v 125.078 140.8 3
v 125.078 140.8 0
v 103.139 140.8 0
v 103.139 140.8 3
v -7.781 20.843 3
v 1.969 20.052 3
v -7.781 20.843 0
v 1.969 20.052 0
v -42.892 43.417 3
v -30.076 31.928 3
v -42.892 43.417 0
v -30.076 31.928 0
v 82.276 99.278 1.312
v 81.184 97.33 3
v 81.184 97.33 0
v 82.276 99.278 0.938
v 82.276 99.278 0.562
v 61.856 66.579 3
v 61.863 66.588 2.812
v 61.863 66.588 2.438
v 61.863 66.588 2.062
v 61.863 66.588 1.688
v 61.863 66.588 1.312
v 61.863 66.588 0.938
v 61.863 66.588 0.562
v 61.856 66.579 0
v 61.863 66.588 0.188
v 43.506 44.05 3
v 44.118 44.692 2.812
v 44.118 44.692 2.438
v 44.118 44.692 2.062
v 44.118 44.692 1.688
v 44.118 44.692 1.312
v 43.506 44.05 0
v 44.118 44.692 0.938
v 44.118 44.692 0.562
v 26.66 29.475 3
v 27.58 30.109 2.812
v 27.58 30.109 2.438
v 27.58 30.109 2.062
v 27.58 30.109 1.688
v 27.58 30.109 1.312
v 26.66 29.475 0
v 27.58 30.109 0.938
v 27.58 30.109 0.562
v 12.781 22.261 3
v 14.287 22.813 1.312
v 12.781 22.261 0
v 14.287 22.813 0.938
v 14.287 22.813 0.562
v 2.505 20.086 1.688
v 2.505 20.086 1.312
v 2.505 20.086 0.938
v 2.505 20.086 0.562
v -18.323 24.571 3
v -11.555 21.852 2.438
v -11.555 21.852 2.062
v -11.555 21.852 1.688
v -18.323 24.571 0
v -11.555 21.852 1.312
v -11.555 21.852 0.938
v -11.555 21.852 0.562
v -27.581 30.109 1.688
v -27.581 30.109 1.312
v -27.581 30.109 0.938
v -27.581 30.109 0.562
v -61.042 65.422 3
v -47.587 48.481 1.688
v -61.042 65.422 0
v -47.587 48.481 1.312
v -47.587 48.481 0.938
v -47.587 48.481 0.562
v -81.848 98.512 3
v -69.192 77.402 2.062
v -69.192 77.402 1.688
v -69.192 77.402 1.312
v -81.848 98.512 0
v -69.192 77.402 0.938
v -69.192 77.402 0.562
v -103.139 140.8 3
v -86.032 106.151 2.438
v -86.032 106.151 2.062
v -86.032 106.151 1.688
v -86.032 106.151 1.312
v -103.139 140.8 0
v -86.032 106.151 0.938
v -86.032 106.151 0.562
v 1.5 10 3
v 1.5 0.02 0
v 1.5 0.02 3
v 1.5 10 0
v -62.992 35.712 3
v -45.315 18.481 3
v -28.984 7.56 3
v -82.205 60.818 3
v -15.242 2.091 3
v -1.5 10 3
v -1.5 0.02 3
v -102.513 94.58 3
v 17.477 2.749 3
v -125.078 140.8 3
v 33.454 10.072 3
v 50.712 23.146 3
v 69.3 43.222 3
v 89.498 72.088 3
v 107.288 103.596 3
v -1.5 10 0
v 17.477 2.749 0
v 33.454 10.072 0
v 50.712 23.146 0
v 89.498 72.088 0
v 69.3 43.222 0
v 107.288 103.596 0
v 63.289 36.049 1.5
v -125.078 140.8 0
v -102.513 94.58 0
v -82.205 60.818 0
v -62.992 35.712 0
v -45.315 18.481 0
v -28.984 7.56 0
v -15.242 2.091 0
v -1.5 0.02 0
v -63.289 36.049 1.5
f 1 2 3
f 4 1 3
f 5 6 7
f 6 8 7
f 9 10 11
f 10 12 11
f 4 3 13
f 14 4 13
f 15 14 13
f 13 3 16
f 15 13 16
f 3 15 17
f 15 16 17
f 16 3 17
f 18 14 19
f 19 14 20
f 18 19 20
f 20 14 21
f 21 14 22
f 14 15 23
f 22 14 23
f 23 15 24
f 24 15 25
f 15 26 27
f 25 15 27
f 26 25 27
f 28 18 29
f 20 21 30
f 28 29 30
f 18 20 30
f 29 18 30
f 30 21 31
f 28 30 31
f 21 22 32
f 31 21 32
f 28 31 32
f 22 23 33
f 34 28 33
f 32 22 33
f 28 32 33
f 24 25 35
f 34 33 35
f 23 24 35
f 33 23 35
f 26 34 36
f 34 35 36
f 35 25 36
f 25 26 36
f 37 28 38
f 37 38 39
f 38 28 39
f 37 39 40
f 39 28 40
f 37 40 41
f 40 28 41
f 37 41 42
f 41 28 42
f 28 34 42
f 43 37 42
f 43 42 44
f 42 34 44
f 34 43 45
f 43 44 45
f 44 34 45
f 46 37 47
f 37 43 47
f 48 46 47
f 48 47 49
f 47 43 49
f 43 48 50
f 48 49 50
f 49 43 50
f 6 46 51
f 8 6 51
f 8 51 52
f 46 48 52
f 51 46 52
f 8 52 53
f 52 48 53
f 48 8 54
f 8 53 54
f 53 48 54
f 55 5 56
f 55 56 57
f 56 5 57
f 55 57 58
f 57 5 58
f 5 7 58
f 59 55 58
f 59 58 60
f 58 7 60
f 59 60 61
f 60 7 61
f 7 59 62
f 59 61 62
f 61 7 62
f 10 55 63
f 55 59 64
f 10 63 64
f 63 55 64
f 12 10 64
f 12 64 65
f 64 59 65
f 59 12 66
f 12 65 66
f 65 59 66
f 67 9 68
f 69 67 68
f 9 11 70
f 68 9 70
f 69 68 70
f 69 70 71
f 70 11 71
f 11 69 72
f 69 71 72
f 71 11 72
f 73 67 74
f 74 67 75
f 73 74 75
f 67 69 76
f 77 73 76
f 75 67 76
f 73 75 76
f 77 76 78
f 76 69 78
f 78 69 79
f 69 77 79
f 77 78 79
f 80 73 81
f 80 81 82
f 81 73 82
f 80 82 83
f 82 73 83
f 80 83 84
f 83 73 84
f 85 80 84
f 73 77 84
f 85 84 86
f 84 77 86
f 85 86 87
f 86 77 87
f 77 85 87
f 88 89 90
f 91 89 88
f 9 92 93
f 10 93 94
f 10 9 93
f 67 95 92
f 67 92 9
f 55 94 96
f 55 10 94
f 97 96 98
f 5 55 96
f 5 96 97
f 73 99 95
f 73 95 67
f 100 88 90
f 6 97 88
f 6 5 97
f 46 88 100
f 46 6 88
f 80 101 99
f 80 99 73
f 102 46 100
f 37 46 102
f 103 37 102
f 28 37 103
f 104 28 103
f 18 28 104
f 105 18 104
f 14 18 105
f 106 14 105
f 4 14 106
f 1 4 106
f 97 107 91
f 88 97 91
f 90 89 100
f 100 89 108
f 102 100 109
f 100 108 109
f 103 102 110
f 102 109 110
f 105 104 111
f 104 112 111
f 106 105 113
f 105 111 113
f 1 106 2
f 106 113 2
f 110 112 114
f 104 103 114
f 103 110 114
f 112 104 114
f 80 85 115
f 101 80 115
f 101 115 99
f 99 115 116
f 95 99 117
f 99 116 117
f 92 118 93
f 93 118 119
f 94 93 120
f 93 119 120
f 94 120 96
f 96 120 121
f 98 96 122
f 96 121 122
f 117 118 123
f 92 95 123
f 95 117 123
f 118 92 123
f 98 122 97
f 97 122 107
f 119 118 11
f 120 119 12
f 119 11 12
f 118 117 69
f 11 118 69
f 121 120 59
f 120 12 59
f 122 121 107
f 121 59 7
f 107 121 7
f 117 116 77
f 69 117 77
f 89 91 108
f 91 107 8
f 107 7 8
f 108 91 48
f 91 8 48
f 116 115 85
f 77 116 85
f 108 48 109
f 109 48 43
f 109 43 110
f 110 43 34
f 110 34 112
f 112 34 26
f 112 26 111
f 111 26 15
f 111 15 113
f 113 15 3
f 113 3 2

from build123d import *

# Parameters (mm, degrees)
BOSS_EXTRUDE1_DEPTH = 3
SKETCH2_W           = 3
SKETCH2_H           = 14.324437629
CUT_EXTRUDE1_DEPTH  = 13


# Read off the part's stored shape, not the designer's step: Boss-Extrude1
with BuildPart() as part:
    # Boss-Extrude1 outline → Boss-Extrude1 (new body)
    with BuildSketch(Plane.XY):
        with BuildLine():
            Line((125.077753595, 140.799999999), (103.138713338, 140.799999999))
            add(Edge.make_bspline(
                [(103.138713338, 140.799999999), (93.542146278, 119.847471898), (72.808653967, 81.938719065), (50.916611333, 51.236700067), (33.870460098, 34.505911397), (21.289730771, 25.712869222), (11.472405571, 21.616258487), (5.010806556, 20.261029403), (-1.7438e-05, 19.910029363), (-5.010839163, 20.261027839), (-11.472453528, 21.616254055), (-21.289588116, 25.712871213), (-33.871531711, 34.505848314), (-47.501408239, 47.890829337), (-61.817933067, 65.995643553), (-76.566426388, 88.807898183), (-93.541811929, 119.847096454), (-103.138713338, 140.800000001)],
                knots=[0.067755266, 0.067755266, 0.067755266, 0.137934979, 0.221488445, 0.305041912, 0.360744223, 0.416446534, 0.458223267, 0.486074422, 0.513925578, 0.541776733, 0.583553466, 0.639255777, 0.694958088, 0.750660399, 0.80636271, 0.862065021, 0.932245043, 0.932245043, 0.932245043], degree=2))
            Line((-103.138713338, 140.800000001), (-125.077753596, 140.800000001))
            add(Edge.make_bspline(
                [(-125.077753596, 140.800000001), (0, -140.8), (125.077753595, 140.799999999)],
                knots=[0.054381513, 0.054381513, 0.054381513, 0.945618487, 0.945618487, 0.945618487], degree=2))
        make_face()
    extrude(amount=BOSS_EXTRUDE1_DEPTH)

    # Sketch2 → Cut-Extrude1 (cut)
    with BuildSketch(Plane.XY):
        with Locations((0, 2.837781185)):
            Rectangle(SKETCH2_W, SKETCH2_H)
    extrude(amount=CUT_EXTRUDE1_DEPTH, mode=Mode.SUBTRACT)


solid = part.part
